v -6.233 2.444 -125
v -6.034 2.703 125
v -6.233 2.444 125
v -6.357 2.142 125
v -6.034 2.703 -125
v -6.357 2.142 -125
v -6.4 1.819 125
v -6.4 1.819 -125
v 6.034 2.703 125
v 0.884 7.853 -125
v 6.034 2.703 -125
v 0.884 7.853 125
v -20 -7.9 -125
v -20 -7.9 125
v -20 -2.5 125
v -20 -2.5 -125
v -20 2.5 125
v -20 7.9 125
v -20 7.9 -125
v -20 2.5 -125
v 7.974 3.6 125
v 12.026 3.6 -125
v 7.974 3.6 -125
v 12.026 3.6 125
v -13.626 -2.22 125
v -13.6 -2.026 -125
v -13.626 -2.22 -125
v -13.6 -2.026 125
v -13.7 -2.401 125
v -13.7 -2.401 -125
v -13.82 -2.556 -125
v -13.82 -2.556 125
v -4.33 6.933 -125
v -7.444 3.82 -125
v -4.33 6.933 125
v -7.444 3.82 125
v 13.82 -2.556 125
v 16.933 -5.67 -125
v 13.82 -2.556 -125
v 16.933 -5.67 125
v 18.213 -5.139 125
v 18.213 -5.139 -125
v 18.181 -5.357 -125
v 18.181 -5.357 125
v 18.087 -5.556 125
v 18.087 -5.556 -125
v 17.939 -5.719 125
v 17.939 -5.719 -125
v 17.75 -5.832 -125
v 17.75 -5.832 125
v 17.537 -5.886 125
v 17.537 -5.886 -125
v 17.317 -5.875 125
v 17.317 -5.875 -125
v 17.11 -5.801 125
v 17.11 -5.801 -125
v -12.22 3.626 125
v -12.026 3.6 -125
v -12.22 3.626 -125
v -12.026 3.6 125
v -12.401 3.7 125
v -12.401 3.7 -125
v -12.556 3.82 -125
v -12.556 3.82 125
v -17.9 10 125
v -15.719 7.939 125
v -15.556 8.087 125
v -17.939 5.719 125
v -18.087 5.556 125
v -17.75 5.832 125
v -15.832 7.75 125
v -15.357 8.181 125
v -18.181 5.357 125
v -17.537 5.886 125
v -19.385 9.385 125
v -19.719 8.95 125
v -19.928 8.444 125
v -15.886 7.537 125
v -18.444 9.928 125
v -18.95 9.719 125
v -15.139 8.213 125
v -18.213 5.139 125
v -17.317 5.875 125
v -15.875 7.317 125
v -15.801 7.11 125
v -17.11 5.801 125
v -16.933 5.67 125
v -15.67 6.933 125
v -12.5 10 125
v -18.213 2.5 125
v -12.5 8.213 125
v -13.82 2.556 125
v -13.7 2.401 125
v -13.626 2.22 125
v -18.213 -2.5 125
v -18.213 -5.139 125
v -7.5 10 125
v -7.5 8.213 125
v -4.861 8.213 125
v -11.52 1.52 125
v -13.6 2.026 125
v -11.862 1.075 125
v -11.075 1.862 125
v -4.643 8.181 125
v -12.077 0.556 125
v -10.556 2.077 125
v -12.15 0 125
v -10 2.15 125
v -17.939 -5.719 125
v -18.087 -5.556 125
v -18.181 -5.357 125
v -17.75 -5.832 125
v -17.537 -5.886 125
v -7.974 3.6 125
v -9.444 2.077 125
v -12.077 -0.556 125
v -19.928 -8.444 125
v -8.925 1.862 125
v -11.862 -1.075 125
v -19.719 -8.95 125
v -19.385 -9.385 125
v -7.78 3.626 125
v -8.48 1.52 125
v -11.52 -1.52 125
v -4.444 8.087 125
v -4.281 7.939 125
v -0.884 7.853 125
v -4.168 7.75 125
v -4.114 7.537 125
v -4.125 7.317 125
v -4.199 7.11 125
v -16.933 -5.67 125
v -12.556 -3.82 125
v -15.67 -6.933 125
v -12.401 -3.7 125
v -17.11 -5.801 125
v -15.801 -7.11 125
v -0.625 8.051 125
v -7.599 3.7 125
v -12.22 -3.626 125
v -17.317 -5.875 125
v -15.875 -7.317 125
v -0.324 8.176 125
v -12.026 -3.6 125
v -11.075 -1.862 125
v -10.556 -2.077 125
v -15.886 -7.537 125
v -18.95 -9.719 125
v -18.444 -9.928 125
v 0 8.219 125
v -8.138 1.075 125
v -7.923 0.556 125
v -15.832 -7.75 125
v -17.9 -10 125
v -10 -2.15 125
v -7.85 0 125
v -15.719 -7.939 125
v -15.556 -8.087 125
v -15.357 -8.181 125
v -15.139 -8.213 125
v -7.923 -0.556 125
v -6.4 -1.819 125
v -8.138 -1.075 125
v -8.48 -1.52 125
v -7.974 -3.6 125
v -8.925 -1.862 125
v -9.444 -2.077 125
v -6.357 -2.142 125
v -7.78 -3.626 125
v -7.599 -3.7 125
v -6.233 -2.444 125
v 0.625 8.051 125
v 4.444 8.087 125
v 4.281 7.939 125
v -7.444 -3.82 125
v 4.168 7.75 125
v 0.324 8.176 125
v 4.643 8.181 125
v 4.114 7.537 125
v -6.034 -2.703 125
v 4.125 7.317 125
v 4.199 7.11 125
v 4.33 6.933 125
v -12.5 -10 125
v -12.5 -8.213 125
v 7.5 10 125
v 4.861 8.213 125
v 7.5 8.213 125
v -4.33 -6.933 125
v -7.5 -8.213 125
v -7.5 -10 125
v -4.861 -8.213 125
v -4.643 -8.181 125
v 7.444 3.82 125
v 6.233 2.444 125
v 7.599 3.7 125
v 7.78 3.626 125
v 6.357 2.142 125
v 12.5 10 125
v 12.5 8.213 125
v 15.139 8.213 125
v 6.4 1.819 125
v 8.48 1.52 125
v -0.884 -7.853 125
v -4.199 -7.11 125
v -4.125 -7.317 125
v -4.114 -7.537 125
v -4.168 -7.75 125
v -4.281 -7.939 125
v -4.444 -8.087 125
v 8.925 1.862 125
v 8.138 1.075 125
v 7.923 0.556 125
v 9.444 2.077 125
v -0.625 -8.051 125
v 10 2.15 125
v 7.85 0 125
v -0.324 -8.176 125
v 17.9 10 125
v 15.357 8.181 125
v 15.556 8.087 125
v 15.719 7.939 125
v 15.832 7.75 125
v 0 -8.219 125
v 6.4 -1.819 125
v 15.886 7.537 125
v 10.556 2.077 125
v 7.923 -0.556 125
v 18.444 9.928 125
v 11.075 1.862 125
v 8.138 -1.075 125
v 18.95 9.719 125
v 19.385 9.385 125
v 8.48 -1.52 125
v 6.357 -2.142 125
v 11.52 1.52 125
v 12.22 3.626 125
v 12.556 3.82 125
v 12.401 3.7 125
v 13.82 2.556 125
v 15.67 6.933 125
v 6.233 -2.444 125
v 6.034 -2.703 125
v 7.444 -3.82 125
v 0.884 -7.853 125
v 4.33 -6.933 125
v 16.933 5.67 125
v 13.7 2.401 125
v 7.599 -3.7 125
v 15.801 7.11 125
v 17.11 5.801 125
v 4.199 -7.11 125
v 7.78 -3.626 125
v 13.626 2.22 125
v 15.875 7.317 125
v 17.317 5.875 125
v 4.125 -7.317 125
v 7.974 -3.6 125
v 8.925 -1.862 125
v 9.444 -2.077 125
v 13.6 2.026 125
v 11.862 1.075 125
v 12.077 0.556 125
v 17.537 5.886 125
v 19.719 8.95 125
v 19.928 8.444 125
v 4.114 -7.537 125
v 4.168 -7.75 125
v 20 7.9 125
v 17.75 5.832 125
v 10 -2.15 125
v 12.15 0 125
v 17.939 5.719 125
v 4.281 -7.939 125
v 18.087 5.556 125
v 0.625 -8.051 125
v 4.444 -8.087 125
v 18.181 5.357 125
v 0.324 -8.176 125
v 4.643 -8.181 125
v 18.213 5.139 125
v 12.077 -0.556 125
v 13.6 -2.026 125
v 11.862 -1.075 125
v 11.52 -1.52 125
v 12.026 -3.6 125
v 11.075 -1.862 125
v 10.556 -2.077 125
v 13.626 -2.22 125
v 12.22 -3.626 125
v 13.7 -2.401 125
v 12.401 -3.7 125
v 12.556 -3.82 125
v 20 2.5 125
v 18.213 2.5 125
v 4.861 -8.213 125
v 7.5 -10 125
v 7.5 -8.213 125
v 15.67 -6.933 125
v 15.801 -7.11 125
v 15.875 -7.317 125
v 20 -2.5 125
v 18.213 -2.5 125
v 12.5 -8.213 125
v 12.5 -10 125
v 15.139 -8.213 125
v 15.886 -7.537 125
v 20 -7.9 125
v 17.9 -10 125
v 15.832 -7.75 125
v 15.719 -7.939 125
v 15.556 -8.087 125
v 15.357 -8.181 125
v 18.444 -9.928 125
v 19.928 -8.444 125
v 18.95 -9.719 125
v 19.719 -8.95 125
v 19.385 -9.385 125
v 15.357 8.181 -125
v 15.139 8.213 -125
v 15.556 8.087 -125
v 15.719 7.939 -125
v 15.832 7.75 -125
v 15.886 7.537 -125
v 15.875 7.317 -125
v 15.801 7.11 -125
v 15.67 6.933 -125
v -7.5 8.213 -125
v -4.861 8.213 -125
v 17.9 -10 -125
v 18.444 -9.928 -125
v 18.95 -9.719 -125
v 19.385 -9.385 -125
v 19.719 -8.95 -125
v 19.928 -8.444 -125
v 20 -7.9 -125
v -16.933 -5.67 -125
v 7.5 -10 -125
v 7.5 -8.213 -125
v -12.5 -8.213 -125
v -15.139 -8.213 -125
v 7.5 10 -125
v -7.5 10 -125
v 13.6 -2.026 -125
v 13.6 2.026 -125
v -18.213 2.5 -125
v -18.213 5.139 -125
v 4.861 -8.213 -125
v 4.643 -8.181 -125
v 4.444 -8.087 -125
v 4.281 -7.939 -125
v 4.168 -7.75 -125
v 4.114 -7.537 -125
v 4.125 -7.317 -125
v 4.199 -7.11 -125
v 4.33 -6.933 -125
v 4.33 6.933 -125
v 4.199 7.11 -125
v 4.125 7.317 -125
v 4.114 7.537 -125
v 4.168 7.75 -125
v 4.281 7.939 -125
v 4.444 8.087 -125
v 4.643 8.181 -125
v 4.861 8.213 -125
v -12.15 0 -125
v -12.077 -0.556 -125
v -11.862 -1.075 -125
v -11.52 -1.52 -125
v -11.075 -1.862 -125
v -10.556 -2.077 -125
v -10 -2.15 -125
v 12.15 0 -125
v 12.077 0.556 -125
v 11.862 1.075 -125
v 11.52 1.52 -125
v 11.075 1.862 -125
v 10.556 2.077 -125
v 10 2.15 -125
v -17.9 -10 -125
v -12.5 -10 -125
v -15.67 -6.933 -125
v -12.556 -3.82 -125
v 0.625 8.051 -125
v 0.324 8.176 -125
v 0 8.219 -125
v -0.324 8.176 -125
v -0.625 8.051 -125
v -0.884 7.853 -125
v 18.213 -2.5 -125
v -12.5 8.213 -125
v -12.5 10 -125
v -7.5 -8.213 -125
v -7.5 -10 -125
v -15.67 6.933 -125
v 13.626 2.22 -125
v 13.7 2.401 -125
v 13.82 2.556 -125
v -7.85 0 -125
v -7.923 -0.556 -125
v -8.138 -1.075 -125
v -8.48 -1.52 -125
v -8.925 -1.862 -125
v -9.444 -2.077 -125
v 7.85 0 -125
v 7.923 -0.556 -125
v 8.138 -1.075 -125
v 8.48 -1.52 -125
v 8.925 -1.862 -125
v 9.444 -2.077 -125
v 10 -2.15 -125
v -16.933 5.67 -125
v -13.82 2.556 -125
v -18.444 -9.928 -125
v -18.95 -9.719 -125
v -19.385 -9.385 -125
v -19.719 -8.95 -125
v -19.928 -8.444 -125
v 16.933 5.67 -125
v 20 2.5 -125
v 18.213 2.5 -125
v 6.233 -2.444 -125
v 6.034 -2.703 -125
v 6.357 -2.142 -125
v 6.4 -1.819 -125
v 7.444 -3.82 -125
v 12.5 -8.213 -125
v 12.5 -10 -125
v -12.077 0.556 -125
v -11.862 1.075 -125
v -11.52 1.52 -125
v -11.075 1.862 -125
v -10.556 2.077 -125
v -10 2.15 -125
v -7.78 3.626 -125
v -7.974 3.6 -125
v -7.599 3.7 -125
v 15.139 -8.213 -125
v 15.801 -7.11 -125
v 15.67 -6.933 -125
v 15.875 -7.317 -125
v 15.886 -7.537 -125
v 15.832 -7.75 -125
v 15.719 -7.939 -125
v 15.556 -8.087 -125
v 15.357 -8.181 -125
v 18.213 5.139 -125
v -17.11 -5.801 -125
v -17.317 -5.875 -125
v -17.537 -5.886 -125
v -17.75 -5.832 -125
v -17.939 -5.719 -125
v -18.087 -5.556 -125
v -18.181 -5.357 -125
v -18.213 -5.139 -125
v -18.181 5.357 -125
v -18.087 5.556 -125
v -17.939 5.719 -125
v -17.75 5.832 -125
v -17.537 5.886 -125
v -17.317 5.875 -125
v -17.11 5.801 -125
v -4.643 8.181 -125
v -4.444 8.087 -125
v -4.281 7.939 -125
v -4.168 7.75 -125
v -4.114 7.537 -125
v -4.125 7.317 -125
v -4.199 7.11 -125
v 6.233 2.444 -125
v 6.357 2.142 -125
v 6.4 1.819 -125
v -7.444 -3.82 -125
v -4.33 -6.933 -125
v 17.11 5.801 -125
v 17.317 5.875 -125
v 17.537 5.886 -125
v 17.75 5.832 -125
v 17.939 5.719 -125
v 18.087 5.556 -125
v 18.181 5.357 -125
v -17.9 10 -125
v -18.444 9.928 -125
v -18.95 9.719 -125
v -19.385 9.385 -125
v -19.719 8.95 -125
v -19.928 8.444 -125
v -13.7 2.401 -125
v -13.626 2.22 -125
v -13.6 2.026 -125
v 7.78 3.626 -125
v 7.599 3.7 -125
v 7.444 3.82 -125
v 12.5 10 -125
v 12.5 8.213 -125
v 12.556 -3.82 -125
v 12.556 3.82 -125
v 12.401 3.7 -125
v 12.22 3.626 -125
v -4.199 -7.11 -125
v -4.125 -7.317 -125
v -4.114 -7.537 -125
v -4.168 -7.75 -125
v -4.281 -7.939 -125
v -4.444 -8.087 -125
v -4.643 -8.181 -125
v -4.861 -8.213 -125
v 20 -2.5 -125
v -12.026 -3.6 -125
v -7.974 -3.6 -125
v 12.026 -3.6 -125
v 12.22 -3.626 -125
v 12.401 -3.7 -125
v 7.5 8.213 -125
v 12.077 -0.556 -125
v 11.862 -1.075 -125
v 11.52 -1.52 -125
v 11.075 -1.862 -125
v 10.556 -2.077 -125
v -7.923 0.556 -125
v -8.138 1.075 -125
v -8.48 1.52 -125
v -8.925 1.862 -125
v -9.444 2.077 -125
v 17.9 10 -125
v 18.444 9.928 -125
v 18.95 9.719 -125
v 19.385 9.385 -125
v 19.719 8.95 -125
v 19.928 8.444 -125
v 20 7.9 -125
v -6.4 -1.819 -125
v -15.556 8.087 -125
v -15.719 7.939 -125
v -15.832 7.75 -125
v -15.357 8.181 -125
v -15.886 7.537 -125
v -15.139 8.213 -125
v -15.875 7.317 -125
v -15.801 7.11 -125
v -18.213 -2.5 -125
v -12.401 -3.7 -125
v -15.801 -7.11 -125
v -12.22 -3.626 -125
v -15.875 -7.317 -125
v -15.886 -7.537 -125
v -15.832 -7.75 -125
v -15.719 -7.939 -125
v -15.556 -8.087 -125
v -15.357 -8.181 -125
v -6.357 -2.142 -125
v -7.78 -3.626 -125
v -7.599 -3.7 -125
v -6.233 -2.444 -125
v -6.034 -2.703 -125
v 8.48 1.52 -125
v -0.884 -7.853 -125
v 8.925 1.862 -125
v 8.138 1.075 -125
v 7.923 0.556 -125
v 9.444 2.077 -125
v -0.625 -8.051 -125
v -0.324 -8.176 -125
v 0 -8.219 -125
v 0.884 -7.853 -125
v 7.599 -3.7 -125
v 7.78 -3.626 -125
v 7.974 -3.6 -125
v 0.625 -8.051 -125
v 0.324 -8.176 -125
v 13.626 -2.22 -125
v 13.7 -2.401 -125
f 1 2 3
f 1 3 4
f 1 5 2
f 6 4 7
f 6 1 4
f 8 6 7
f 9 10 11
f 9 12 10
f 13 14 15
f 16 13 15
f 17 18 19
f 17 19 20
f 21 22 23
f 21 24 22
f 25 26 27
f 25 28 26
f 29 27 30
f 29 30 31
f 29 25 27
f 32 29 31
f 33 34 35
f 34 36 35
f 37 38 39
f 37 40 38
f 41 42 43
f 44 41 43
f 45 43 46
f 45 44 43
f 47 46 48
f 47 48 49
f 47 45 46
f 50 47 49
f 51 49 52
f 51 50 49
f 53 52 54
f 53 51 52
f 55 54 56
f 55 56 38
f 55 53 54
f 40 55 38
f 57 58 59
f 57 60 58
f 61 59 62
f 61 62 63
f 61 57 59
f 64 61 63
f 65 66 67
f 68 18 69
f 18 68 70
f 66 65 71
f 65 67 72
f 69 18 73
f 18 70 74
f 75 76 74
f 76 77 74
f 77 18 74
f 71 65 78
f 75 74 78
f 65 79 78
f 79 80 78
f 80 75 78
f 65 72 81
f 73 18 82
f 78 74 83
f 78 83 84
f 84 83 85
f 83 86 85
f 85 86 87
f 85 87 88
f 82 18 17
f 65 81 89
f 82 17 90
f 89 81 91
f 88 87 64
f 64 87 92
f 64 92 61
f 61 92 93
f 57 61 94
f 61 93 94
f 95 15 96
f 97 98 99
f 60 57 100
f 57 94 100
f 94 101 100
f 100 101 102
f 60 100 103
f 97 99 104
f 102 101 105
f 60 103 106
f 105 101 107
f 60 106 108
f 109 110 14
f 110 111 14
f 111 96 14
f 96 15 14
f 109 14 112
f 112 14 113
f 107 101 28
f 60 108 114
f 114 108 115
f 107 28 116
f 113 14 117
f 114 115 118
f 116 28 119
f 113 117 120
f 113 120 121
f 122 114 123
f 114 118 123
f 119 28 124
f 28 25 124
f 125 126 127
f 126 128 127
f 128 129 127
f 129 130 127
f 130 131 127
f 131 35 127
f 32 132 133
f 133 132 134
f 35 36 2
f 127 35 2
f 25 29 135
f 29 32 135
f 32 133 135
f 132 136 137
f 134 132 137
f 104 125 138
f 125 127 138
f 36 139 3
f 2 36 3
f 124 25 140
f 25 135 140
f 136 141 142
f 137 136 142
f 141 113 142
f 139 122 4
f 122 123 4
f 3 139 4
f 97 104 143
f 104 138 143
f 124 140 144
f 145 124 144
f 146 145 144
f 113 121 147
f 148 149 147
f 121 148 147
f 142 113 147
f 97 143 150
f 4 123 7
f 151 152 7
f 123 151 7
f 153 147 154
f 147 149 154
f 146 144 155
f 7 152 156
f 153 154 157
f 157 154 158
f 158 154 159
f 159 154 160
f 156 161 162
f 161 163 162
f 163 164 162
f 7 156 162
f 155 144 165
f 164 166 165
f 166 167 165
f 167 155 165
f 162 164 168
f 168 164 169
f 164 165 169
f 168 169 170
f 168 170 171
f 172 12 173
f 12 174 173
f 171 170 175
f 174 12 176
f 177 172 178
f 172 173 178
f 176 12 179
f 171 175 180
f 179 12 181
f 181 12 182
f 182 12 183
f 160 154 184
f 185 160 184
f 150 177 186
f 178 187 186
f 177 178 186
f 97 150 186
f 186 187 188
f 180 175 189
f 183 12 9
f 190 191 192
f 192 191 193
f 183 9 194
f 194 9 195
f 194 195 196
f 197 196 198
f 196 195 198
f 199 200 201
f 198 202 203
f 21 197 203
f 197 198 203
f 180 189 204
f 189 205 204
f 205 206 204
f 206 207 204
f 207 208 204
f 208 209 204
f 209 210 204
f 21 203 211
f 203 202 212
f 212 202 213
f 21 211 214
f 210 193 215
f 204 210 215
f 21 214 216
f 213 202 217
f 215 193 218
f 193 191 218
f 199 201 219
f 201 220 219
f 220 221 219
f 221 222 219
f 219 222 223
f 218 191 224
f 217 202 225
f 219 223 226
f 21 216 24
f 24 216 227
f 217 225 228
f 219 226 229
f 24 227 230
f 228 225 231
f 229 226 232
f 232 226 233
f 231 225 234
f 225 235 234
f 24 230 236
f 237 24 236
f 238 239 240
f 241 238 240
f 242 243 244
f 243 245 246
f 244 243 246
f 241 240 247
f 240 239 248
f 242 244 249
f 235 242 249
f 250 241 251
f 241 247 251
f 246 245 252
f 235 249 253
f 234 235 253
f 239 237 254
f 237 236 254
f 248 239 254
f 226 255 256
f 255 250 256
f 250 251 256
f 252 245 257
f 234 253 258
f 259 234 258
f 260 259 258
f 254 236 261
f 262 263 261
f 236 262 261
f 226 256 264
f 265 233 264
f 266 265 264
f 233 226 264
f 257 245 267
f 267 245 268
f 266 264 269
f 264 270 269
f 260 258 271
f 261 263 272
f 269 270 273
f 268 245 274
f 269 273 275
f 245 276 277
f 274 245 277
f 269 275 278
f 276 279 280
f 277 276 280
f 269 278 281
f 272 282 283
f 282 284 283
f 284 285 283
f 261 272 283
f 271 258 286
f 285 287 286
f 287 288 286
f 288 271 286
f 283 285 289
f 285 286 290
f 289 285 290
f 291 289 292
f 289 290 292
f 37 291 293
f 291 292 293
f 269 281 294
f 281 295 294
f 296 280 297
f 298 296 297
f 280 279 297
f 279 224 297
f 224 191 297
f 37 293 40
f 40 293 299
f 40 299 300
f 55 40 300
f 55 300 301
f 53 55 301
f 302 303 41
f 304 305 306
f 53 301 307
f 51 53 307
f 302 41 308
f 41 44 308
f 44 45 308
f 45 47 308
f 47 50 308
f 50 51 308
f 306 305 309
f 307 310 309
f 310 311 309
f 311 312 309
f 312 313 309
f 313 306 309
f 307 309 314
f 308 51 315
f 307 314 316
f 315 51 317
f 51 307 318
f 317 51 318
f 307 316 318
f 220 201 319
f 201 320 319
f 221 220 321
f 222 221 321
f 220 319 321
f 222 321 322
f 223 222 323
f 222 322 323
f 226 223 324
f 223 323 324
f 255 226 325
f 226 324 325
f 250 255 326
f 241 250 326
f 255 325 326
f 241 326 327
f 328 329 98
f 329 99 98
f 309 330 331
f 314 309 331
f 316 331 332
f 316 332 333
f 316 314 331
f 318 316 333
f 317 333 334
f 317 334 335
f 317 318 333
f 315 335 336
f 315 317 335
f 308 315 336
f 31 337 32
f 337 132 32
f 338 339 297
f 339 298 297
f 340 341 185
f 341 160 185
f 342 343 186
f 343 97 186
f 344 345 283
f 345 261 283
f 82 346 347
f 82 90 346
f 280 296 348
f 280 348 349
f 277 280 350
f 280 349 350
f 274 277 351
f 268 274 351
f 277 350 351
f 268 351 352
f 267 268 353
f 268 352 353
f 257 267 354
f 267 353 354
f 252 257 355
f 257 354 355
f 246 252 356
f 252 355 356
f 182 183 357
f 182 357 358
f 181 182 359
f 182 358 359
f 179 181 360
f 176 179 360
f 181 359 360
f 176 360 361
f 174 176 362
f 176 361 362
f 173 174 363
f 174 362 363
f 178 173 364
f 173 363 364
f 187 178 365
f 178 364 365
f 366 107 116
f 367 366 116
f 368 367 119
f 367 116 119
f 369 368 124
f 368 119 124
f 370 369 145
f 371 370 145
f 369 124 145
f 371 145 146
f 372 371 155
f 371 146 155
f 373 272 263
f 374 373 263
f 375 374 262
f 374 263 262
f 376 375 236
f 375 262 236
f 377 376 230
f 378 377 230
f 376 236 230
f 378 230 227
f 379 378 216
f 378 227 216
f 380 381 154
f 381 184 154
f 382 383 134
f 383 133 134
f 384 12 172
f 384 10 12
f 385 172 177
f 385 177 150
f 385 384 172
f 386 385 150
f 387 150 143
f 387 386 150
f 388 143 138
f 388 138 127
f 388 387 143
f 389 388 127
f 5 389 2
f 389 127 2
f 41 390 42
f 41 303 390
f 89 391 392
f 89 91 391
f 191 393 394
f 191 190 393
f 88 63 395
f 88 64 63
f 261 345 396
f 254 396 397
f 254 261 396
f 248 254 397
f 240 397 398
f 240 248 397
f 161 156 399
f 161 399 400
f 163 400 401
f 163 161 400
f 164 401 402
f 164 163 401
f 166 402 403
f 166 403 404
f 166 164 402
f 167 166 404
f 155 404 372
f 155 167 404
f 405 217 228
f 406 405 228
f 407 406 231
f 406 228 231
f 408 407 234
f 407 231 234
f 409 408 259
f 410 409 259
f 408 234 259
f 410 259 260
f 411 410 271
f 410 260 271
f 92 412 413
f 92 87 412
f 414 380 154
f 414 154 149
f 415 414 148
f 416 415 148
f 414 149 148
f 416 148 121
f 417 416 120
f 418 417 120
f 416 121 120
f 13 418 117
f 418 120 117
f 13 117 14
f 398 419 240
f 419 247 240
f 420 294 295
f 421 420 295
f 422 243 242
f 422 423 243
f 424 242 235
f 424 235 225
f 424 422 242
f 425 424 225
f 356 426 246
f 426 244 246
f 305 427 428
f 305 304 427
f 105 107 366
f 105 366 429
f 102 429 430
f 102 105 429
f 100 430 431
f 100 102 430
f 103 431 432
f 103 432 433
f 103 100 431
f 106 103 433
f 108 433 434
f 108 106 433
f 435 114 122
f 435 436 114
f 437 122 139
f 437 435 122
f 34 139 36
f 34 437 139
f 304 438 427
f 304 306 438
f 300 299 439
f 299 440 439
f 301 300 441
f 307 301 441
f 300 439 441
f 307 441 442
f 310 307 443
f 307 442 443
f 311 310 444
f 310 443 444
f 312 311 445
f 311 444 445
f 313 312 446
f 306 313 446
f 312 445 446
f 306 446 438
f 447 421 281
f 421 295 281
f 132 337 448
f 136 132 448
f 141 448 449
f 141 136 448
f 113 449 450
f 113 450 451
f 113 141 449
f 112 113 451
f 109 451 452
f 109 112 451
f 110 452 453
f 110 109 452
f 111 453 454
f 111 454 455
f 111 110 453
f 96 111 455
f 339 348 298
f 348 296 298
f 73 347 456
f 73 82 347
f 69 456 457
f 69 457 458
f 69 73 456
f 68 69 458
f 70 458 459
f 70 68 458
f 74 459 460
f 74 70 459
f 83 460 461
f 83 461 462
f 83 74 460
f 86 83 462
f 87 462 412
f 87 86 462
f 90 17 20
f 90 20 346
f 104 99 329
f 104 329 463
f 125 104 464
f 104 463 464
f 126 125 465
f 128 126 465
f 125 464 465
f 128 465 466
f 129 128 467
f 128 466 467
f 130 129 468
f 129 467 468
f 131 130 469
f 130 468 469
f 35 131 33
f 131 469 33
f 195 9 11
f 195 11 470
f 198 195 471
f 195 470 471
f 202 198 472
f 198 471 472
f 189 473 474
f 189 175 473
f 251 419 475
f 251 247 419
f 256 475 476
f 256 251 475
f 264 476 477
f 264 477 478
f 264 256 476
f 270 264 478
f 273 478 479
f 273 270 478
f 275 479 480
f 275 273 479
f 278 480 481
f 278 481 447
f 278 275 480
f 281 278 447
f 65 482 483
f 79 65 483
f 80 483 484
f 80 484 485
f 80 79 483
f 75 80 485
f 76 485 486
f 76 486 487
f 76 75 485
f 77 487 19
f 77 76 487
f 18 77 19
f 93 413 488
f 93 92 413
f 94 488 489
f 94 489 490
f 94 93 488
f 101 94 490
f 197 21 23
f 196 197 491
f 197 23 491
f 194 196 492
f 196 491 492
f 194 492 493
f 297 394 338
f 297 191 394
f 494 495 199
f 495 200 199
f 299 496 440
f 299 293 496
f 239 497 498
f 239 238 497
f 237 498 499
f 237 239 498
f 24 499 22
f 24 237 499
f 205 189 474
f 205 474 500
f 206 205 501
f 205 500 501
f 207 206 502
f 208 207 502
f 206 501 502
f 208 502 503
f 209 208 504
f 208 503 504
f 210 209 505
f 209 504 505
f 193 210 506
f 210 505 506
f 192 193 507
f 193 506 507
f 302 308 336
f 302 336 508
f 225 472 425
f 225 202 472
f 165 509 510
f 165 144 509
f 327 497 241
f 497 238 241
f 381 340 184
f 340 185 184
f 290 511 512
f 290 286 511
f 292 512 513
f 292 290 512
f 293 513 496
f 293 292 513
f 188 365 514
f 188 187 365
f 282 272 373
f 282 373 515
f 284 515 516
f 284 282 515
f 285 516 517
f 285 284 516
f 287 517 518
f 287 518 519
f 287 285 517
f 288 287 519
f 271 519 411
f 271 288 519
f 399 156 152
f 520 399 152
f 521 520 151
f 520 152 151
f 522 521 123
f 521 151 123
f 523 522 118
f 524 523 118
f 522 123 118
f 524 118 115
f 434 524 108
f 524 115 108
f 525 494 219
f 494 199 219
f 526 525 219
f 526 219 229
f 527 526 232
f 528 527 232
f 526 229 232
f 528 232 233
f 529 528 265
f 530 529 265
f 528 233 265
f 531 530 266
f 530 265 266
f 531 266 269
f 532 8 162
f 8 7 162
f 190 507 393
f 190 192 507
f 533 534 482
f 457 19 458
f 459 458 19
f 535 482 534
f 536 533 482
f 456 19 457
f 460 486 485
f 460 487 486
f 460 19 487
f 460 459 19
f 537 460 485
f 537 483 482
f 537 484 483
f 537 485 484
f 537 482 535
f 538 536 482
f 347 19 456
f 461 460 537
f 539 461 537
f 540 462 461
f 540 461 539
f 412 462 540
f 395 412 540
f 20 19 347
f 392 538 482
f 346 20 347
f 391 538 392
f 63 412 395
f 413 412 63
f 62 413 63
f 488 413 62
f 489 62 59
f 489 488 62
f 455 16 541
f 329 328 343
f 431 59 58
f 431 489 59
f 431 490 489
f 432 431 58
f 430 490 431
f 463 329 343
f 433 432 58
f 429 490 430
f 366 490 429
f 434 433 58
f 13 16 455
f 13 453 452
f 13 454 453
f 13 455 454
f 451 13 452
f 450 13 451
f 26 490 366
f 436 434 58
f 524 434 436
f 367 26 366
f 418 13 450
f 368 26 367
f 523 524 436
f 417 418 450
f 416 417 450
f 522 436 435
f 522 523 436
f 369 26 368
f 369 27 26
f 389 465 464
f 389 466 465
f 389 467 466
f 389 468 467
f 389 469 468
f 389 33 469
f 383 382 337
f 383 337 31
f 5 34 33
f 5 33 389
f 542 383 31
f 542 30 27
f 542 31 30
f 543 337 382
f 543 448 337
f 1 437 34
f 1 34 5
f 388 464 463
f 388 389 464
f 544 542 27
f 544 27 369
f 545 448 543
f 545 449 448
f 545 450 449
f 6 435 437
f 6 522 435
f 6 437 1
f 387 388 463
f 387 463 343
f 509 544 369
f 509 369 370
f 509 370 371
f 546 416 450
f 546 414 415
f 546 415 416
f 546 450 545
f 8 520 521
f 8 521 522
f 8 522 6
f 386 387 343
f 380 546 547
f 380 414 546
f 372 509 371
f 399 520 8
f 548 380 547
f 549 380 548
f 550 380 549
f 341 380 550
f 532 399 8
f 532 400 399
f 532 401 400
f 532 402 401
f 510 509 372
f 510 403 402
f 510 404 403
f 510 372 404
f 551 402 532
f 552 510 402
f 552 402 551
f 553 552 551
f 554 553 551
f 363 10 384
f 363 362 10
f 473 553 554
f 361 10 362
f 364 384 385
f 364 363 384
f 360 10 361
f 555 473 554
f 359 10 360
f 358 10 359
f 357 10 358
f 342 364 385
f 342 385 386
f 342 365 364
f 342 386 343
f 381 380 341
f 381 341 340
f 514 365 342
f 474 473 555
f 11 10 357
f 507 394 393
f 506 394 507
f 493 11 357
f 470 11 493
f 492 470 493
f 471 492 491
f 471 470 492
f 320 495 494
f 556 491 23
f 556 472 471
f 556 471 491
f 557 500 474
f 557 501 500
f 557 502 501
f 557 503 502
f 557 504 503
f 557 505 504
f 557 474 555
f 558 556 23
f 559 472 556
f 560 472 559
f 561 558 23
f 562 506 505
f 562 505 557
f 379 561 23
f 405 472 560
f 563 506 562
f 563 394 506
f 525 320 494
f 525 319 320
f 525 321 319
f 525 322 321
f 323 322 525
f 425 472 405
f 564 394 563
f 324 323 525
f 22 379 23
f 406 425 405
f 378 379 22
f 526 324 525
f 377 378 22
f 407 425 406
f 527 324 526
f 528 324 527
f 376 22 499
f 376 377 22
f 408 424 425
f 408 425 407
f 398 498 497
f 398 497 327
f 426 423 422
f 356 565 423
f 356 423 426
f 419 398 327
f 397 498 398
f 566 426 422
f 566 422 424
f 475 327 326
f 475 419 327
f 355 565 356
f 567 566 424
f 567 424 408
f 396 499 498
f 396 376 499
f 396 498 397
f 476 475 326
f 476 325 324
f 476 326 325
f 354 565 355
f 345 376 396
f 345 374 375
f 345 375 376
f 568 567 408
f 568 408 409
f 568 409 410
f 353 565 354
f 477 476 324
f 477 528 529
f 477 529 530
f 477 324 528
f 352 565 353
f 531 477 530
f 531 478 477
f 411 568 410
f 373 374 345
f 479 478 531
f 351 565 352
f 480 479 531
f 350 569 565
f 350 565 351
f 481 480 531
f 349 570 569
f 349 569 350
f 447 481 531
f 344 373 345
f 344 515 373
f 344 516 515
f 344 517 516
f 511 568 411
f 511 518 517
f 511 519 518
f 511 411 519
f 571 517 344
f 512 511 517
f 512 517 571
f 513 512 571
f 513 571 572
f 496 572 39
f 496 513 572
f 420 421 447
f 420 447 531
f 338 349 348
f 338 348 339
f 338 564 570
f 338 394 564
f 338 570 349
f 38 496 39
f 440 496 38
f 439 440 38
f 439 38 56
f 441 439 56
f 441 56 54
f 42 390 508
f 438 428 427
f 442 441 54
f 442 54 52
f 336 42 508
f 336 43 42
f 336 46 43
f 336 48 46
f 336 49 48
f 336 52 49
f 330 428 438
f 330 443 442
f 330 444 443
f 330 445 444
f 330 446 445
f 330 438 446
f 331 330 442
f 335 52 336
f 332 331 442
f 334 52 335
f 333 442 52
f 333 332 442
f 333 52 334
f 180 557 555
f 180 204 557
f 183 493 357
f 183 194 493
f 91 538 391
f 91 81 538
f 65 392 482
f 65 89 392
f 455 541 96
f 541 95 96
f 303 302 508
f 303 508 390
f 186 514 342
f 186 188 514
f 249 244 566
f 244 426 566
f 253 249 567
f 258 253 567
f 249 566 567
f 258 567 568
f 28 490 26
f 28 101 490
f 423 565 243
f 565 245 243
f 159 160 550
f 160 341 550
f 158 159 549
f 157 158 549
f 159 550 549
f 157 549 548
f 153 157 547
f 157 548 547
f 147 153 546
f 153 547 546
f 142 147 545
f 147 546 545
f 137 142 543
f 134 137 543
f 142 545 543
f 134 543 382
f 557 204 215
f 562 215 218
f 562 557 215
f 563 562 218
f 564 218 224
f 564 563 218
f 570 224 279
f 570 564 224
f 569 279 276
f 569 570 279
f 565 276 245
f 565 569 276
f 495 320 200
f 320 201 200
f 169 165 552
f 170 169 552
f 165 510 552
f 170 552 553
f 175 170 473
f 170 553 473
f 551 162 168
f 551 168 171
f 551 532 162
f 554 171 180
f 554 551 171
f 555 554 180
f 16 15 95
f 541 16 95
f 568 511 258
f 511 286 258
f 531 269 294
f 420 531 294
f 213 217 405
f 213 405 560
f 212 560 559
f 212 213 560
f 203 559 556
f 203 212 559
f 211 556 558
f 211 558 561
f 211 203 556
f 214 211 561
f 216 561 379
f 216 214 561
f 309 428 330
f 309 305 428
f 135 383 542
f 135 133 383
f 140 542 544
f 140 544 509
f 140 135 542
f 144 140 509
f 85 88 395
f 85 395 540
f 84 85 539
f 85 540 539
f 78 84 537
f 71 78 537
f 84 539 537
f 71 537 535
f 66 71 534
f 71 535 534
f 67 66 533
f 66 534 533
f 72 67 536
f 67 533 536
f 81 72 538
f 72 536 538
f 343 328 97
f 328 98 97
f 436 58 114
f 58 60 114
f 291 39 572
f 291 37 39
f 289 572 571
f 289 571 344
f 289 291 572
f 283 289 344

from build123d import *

# Parameters (mm, degrees)
BOSS_EXTRUDE1_DEPTH = 125
BOSS_EXTRUDE2_DEPTH = 125
FILLET1_R           = 0.75
FILLET2_R           = 1.25


with BuildPart() as part:
    # Sketch3 → Boss-Extrude1 (new body, symmetric)
    with BuildSketch(Plane.XY):
        with BuildLine():
            Line((12.5, -10), (17.9, -10))
            ThreePointArc((17.9, -10), (19.38492424, -9.38492424), (20, -7.9))
            Line((20, -7.9), (20, -2.5))
            Line((20, -2.5), (18.213351365, -2.5))
            Line((18.213351365, -2.5), (18.213351365, -6.95))
            Line((18.213351365, -6.95), (13.6, -2.336648635))
            Line((13.6, -2.336648635), (13.6, 0))
            Line((13.6, 0), (12.15, 0))
            ThreePointArc((12.15, 0), (11.52027958, -1.52027958), (10, -2.15))
            Line((10, -2.15), (10, -3.6))
            Line((10, -3.6), (12.336648635, -3.6))
            Line((12.336648635, -3.6), (16.95, -8.213351365))
            Line((16.95, -8.213351365), (12.5, -8.213351365))
            Line((12.5, -8.213351365), (12.5, -10))
        make_face()
    extrude(amount=BOSS_EXTRUDE1_DEPTH, both=True)

    # Sketch4 → Boss-Extrude2 (add, symmetric)
    with BuildSketch(Plane.XY):
        with BuildLine():
            Line((10, -3.6), (7.663351365, -3.6))
            Line((7.663351365, -3.6), (3.05, -8.213351365))
            Line((3.05, -8.213351365), (7.5, -8.213351365))
            Line((7.5, -8.213351365), (7.5, -10))
            Line((7.5, -10), (0, -10))
            Line((0, -10), (0, -8.736648635))
            Line((0, -8.736648635), (6.4, -2.336648635))
            Line((6.4, -2.336648635), (6.4, 0))
            Line((6.4, 0), (7.85, 0))
            ThreePointArc((7.85, 0), (8.47972042, -1.52027958), (10, -2.15))
            Line((10, -2.15), (10, -3.6))
        make_face()
    extrude(amount=BOSS_EXTRUDE2_DEPTH, both=True)

    # Mirror1: part across plane


with BuildPart() as part_1:
    add(part.part)
    add(part.part.mirror(Plane(origin=(0, 0, 0), x_dir=(0, 0, 1), z_dir=(1, 0, 0))))

    # Mirror2: part across plane


with BuildPart() as part_2:
    add(part_1.part)
    add(part_1.part.mirror(Plane.ZX))

    # Fillet1
    fillet1_edges = [part_2.edges().sort_by_distance(p)[0] for p in [
        (18.213351365, 6.95, 0),
        (13.6, 2.336648635, 0),
        (12.336648635, 3.6, 0),
        (16.95, 8.213351365, 0),
        (3.05, 8.213351365, 0),
        (7.663351365, 3.6, 0),
        (-18.213351365, 6.95, 0),
        (-13.6, 2.336648635, 0),
        (-7.663351365, 3.6, 0),
        (-12.336648635, 3.6, 0),
        (-16.95, 8.213351365, 0),
        (-3.05, 8.213351365, 0),
        (16.95, -8.213351365, 0),
        (12.336648635, -3.6, 0),
        (13.6, -2.336648635, 0),
        (18.213351365, -6.95, 0),
        (3.05, -8.213351365, 0),
        (7.663351365, -3.6, 0),
        (-18.213351365, -6.95, 0),
        (-13.6, -2.336648635, 0),
        (-12.336648635, -3.6, 0),
        (-16.95, -8.213351365, 0),
        (-3.05, -8.213351365, 0),
        (-7.663351365, -3.6, 0),
    ]]
    fillet(fillet1_edges, radius=FILLET1_R)

    # Fillet2
    fillet2_edges = [part_2.edges().sort_by_distance(p)[0] for p in [
        (6.4, 2.336648635, 0),
        (0, 8.736648635, 0),
        (-6.4, 2.336648635, 0),
        (6.4, -2.336648635, 0),
        (-6.4, -2.336648635, 0),
        (0, -8.736648635, 0),
    ]]
    fillet(fillet2_edges, radius=FILLET2_R)


solid = part_2.part
